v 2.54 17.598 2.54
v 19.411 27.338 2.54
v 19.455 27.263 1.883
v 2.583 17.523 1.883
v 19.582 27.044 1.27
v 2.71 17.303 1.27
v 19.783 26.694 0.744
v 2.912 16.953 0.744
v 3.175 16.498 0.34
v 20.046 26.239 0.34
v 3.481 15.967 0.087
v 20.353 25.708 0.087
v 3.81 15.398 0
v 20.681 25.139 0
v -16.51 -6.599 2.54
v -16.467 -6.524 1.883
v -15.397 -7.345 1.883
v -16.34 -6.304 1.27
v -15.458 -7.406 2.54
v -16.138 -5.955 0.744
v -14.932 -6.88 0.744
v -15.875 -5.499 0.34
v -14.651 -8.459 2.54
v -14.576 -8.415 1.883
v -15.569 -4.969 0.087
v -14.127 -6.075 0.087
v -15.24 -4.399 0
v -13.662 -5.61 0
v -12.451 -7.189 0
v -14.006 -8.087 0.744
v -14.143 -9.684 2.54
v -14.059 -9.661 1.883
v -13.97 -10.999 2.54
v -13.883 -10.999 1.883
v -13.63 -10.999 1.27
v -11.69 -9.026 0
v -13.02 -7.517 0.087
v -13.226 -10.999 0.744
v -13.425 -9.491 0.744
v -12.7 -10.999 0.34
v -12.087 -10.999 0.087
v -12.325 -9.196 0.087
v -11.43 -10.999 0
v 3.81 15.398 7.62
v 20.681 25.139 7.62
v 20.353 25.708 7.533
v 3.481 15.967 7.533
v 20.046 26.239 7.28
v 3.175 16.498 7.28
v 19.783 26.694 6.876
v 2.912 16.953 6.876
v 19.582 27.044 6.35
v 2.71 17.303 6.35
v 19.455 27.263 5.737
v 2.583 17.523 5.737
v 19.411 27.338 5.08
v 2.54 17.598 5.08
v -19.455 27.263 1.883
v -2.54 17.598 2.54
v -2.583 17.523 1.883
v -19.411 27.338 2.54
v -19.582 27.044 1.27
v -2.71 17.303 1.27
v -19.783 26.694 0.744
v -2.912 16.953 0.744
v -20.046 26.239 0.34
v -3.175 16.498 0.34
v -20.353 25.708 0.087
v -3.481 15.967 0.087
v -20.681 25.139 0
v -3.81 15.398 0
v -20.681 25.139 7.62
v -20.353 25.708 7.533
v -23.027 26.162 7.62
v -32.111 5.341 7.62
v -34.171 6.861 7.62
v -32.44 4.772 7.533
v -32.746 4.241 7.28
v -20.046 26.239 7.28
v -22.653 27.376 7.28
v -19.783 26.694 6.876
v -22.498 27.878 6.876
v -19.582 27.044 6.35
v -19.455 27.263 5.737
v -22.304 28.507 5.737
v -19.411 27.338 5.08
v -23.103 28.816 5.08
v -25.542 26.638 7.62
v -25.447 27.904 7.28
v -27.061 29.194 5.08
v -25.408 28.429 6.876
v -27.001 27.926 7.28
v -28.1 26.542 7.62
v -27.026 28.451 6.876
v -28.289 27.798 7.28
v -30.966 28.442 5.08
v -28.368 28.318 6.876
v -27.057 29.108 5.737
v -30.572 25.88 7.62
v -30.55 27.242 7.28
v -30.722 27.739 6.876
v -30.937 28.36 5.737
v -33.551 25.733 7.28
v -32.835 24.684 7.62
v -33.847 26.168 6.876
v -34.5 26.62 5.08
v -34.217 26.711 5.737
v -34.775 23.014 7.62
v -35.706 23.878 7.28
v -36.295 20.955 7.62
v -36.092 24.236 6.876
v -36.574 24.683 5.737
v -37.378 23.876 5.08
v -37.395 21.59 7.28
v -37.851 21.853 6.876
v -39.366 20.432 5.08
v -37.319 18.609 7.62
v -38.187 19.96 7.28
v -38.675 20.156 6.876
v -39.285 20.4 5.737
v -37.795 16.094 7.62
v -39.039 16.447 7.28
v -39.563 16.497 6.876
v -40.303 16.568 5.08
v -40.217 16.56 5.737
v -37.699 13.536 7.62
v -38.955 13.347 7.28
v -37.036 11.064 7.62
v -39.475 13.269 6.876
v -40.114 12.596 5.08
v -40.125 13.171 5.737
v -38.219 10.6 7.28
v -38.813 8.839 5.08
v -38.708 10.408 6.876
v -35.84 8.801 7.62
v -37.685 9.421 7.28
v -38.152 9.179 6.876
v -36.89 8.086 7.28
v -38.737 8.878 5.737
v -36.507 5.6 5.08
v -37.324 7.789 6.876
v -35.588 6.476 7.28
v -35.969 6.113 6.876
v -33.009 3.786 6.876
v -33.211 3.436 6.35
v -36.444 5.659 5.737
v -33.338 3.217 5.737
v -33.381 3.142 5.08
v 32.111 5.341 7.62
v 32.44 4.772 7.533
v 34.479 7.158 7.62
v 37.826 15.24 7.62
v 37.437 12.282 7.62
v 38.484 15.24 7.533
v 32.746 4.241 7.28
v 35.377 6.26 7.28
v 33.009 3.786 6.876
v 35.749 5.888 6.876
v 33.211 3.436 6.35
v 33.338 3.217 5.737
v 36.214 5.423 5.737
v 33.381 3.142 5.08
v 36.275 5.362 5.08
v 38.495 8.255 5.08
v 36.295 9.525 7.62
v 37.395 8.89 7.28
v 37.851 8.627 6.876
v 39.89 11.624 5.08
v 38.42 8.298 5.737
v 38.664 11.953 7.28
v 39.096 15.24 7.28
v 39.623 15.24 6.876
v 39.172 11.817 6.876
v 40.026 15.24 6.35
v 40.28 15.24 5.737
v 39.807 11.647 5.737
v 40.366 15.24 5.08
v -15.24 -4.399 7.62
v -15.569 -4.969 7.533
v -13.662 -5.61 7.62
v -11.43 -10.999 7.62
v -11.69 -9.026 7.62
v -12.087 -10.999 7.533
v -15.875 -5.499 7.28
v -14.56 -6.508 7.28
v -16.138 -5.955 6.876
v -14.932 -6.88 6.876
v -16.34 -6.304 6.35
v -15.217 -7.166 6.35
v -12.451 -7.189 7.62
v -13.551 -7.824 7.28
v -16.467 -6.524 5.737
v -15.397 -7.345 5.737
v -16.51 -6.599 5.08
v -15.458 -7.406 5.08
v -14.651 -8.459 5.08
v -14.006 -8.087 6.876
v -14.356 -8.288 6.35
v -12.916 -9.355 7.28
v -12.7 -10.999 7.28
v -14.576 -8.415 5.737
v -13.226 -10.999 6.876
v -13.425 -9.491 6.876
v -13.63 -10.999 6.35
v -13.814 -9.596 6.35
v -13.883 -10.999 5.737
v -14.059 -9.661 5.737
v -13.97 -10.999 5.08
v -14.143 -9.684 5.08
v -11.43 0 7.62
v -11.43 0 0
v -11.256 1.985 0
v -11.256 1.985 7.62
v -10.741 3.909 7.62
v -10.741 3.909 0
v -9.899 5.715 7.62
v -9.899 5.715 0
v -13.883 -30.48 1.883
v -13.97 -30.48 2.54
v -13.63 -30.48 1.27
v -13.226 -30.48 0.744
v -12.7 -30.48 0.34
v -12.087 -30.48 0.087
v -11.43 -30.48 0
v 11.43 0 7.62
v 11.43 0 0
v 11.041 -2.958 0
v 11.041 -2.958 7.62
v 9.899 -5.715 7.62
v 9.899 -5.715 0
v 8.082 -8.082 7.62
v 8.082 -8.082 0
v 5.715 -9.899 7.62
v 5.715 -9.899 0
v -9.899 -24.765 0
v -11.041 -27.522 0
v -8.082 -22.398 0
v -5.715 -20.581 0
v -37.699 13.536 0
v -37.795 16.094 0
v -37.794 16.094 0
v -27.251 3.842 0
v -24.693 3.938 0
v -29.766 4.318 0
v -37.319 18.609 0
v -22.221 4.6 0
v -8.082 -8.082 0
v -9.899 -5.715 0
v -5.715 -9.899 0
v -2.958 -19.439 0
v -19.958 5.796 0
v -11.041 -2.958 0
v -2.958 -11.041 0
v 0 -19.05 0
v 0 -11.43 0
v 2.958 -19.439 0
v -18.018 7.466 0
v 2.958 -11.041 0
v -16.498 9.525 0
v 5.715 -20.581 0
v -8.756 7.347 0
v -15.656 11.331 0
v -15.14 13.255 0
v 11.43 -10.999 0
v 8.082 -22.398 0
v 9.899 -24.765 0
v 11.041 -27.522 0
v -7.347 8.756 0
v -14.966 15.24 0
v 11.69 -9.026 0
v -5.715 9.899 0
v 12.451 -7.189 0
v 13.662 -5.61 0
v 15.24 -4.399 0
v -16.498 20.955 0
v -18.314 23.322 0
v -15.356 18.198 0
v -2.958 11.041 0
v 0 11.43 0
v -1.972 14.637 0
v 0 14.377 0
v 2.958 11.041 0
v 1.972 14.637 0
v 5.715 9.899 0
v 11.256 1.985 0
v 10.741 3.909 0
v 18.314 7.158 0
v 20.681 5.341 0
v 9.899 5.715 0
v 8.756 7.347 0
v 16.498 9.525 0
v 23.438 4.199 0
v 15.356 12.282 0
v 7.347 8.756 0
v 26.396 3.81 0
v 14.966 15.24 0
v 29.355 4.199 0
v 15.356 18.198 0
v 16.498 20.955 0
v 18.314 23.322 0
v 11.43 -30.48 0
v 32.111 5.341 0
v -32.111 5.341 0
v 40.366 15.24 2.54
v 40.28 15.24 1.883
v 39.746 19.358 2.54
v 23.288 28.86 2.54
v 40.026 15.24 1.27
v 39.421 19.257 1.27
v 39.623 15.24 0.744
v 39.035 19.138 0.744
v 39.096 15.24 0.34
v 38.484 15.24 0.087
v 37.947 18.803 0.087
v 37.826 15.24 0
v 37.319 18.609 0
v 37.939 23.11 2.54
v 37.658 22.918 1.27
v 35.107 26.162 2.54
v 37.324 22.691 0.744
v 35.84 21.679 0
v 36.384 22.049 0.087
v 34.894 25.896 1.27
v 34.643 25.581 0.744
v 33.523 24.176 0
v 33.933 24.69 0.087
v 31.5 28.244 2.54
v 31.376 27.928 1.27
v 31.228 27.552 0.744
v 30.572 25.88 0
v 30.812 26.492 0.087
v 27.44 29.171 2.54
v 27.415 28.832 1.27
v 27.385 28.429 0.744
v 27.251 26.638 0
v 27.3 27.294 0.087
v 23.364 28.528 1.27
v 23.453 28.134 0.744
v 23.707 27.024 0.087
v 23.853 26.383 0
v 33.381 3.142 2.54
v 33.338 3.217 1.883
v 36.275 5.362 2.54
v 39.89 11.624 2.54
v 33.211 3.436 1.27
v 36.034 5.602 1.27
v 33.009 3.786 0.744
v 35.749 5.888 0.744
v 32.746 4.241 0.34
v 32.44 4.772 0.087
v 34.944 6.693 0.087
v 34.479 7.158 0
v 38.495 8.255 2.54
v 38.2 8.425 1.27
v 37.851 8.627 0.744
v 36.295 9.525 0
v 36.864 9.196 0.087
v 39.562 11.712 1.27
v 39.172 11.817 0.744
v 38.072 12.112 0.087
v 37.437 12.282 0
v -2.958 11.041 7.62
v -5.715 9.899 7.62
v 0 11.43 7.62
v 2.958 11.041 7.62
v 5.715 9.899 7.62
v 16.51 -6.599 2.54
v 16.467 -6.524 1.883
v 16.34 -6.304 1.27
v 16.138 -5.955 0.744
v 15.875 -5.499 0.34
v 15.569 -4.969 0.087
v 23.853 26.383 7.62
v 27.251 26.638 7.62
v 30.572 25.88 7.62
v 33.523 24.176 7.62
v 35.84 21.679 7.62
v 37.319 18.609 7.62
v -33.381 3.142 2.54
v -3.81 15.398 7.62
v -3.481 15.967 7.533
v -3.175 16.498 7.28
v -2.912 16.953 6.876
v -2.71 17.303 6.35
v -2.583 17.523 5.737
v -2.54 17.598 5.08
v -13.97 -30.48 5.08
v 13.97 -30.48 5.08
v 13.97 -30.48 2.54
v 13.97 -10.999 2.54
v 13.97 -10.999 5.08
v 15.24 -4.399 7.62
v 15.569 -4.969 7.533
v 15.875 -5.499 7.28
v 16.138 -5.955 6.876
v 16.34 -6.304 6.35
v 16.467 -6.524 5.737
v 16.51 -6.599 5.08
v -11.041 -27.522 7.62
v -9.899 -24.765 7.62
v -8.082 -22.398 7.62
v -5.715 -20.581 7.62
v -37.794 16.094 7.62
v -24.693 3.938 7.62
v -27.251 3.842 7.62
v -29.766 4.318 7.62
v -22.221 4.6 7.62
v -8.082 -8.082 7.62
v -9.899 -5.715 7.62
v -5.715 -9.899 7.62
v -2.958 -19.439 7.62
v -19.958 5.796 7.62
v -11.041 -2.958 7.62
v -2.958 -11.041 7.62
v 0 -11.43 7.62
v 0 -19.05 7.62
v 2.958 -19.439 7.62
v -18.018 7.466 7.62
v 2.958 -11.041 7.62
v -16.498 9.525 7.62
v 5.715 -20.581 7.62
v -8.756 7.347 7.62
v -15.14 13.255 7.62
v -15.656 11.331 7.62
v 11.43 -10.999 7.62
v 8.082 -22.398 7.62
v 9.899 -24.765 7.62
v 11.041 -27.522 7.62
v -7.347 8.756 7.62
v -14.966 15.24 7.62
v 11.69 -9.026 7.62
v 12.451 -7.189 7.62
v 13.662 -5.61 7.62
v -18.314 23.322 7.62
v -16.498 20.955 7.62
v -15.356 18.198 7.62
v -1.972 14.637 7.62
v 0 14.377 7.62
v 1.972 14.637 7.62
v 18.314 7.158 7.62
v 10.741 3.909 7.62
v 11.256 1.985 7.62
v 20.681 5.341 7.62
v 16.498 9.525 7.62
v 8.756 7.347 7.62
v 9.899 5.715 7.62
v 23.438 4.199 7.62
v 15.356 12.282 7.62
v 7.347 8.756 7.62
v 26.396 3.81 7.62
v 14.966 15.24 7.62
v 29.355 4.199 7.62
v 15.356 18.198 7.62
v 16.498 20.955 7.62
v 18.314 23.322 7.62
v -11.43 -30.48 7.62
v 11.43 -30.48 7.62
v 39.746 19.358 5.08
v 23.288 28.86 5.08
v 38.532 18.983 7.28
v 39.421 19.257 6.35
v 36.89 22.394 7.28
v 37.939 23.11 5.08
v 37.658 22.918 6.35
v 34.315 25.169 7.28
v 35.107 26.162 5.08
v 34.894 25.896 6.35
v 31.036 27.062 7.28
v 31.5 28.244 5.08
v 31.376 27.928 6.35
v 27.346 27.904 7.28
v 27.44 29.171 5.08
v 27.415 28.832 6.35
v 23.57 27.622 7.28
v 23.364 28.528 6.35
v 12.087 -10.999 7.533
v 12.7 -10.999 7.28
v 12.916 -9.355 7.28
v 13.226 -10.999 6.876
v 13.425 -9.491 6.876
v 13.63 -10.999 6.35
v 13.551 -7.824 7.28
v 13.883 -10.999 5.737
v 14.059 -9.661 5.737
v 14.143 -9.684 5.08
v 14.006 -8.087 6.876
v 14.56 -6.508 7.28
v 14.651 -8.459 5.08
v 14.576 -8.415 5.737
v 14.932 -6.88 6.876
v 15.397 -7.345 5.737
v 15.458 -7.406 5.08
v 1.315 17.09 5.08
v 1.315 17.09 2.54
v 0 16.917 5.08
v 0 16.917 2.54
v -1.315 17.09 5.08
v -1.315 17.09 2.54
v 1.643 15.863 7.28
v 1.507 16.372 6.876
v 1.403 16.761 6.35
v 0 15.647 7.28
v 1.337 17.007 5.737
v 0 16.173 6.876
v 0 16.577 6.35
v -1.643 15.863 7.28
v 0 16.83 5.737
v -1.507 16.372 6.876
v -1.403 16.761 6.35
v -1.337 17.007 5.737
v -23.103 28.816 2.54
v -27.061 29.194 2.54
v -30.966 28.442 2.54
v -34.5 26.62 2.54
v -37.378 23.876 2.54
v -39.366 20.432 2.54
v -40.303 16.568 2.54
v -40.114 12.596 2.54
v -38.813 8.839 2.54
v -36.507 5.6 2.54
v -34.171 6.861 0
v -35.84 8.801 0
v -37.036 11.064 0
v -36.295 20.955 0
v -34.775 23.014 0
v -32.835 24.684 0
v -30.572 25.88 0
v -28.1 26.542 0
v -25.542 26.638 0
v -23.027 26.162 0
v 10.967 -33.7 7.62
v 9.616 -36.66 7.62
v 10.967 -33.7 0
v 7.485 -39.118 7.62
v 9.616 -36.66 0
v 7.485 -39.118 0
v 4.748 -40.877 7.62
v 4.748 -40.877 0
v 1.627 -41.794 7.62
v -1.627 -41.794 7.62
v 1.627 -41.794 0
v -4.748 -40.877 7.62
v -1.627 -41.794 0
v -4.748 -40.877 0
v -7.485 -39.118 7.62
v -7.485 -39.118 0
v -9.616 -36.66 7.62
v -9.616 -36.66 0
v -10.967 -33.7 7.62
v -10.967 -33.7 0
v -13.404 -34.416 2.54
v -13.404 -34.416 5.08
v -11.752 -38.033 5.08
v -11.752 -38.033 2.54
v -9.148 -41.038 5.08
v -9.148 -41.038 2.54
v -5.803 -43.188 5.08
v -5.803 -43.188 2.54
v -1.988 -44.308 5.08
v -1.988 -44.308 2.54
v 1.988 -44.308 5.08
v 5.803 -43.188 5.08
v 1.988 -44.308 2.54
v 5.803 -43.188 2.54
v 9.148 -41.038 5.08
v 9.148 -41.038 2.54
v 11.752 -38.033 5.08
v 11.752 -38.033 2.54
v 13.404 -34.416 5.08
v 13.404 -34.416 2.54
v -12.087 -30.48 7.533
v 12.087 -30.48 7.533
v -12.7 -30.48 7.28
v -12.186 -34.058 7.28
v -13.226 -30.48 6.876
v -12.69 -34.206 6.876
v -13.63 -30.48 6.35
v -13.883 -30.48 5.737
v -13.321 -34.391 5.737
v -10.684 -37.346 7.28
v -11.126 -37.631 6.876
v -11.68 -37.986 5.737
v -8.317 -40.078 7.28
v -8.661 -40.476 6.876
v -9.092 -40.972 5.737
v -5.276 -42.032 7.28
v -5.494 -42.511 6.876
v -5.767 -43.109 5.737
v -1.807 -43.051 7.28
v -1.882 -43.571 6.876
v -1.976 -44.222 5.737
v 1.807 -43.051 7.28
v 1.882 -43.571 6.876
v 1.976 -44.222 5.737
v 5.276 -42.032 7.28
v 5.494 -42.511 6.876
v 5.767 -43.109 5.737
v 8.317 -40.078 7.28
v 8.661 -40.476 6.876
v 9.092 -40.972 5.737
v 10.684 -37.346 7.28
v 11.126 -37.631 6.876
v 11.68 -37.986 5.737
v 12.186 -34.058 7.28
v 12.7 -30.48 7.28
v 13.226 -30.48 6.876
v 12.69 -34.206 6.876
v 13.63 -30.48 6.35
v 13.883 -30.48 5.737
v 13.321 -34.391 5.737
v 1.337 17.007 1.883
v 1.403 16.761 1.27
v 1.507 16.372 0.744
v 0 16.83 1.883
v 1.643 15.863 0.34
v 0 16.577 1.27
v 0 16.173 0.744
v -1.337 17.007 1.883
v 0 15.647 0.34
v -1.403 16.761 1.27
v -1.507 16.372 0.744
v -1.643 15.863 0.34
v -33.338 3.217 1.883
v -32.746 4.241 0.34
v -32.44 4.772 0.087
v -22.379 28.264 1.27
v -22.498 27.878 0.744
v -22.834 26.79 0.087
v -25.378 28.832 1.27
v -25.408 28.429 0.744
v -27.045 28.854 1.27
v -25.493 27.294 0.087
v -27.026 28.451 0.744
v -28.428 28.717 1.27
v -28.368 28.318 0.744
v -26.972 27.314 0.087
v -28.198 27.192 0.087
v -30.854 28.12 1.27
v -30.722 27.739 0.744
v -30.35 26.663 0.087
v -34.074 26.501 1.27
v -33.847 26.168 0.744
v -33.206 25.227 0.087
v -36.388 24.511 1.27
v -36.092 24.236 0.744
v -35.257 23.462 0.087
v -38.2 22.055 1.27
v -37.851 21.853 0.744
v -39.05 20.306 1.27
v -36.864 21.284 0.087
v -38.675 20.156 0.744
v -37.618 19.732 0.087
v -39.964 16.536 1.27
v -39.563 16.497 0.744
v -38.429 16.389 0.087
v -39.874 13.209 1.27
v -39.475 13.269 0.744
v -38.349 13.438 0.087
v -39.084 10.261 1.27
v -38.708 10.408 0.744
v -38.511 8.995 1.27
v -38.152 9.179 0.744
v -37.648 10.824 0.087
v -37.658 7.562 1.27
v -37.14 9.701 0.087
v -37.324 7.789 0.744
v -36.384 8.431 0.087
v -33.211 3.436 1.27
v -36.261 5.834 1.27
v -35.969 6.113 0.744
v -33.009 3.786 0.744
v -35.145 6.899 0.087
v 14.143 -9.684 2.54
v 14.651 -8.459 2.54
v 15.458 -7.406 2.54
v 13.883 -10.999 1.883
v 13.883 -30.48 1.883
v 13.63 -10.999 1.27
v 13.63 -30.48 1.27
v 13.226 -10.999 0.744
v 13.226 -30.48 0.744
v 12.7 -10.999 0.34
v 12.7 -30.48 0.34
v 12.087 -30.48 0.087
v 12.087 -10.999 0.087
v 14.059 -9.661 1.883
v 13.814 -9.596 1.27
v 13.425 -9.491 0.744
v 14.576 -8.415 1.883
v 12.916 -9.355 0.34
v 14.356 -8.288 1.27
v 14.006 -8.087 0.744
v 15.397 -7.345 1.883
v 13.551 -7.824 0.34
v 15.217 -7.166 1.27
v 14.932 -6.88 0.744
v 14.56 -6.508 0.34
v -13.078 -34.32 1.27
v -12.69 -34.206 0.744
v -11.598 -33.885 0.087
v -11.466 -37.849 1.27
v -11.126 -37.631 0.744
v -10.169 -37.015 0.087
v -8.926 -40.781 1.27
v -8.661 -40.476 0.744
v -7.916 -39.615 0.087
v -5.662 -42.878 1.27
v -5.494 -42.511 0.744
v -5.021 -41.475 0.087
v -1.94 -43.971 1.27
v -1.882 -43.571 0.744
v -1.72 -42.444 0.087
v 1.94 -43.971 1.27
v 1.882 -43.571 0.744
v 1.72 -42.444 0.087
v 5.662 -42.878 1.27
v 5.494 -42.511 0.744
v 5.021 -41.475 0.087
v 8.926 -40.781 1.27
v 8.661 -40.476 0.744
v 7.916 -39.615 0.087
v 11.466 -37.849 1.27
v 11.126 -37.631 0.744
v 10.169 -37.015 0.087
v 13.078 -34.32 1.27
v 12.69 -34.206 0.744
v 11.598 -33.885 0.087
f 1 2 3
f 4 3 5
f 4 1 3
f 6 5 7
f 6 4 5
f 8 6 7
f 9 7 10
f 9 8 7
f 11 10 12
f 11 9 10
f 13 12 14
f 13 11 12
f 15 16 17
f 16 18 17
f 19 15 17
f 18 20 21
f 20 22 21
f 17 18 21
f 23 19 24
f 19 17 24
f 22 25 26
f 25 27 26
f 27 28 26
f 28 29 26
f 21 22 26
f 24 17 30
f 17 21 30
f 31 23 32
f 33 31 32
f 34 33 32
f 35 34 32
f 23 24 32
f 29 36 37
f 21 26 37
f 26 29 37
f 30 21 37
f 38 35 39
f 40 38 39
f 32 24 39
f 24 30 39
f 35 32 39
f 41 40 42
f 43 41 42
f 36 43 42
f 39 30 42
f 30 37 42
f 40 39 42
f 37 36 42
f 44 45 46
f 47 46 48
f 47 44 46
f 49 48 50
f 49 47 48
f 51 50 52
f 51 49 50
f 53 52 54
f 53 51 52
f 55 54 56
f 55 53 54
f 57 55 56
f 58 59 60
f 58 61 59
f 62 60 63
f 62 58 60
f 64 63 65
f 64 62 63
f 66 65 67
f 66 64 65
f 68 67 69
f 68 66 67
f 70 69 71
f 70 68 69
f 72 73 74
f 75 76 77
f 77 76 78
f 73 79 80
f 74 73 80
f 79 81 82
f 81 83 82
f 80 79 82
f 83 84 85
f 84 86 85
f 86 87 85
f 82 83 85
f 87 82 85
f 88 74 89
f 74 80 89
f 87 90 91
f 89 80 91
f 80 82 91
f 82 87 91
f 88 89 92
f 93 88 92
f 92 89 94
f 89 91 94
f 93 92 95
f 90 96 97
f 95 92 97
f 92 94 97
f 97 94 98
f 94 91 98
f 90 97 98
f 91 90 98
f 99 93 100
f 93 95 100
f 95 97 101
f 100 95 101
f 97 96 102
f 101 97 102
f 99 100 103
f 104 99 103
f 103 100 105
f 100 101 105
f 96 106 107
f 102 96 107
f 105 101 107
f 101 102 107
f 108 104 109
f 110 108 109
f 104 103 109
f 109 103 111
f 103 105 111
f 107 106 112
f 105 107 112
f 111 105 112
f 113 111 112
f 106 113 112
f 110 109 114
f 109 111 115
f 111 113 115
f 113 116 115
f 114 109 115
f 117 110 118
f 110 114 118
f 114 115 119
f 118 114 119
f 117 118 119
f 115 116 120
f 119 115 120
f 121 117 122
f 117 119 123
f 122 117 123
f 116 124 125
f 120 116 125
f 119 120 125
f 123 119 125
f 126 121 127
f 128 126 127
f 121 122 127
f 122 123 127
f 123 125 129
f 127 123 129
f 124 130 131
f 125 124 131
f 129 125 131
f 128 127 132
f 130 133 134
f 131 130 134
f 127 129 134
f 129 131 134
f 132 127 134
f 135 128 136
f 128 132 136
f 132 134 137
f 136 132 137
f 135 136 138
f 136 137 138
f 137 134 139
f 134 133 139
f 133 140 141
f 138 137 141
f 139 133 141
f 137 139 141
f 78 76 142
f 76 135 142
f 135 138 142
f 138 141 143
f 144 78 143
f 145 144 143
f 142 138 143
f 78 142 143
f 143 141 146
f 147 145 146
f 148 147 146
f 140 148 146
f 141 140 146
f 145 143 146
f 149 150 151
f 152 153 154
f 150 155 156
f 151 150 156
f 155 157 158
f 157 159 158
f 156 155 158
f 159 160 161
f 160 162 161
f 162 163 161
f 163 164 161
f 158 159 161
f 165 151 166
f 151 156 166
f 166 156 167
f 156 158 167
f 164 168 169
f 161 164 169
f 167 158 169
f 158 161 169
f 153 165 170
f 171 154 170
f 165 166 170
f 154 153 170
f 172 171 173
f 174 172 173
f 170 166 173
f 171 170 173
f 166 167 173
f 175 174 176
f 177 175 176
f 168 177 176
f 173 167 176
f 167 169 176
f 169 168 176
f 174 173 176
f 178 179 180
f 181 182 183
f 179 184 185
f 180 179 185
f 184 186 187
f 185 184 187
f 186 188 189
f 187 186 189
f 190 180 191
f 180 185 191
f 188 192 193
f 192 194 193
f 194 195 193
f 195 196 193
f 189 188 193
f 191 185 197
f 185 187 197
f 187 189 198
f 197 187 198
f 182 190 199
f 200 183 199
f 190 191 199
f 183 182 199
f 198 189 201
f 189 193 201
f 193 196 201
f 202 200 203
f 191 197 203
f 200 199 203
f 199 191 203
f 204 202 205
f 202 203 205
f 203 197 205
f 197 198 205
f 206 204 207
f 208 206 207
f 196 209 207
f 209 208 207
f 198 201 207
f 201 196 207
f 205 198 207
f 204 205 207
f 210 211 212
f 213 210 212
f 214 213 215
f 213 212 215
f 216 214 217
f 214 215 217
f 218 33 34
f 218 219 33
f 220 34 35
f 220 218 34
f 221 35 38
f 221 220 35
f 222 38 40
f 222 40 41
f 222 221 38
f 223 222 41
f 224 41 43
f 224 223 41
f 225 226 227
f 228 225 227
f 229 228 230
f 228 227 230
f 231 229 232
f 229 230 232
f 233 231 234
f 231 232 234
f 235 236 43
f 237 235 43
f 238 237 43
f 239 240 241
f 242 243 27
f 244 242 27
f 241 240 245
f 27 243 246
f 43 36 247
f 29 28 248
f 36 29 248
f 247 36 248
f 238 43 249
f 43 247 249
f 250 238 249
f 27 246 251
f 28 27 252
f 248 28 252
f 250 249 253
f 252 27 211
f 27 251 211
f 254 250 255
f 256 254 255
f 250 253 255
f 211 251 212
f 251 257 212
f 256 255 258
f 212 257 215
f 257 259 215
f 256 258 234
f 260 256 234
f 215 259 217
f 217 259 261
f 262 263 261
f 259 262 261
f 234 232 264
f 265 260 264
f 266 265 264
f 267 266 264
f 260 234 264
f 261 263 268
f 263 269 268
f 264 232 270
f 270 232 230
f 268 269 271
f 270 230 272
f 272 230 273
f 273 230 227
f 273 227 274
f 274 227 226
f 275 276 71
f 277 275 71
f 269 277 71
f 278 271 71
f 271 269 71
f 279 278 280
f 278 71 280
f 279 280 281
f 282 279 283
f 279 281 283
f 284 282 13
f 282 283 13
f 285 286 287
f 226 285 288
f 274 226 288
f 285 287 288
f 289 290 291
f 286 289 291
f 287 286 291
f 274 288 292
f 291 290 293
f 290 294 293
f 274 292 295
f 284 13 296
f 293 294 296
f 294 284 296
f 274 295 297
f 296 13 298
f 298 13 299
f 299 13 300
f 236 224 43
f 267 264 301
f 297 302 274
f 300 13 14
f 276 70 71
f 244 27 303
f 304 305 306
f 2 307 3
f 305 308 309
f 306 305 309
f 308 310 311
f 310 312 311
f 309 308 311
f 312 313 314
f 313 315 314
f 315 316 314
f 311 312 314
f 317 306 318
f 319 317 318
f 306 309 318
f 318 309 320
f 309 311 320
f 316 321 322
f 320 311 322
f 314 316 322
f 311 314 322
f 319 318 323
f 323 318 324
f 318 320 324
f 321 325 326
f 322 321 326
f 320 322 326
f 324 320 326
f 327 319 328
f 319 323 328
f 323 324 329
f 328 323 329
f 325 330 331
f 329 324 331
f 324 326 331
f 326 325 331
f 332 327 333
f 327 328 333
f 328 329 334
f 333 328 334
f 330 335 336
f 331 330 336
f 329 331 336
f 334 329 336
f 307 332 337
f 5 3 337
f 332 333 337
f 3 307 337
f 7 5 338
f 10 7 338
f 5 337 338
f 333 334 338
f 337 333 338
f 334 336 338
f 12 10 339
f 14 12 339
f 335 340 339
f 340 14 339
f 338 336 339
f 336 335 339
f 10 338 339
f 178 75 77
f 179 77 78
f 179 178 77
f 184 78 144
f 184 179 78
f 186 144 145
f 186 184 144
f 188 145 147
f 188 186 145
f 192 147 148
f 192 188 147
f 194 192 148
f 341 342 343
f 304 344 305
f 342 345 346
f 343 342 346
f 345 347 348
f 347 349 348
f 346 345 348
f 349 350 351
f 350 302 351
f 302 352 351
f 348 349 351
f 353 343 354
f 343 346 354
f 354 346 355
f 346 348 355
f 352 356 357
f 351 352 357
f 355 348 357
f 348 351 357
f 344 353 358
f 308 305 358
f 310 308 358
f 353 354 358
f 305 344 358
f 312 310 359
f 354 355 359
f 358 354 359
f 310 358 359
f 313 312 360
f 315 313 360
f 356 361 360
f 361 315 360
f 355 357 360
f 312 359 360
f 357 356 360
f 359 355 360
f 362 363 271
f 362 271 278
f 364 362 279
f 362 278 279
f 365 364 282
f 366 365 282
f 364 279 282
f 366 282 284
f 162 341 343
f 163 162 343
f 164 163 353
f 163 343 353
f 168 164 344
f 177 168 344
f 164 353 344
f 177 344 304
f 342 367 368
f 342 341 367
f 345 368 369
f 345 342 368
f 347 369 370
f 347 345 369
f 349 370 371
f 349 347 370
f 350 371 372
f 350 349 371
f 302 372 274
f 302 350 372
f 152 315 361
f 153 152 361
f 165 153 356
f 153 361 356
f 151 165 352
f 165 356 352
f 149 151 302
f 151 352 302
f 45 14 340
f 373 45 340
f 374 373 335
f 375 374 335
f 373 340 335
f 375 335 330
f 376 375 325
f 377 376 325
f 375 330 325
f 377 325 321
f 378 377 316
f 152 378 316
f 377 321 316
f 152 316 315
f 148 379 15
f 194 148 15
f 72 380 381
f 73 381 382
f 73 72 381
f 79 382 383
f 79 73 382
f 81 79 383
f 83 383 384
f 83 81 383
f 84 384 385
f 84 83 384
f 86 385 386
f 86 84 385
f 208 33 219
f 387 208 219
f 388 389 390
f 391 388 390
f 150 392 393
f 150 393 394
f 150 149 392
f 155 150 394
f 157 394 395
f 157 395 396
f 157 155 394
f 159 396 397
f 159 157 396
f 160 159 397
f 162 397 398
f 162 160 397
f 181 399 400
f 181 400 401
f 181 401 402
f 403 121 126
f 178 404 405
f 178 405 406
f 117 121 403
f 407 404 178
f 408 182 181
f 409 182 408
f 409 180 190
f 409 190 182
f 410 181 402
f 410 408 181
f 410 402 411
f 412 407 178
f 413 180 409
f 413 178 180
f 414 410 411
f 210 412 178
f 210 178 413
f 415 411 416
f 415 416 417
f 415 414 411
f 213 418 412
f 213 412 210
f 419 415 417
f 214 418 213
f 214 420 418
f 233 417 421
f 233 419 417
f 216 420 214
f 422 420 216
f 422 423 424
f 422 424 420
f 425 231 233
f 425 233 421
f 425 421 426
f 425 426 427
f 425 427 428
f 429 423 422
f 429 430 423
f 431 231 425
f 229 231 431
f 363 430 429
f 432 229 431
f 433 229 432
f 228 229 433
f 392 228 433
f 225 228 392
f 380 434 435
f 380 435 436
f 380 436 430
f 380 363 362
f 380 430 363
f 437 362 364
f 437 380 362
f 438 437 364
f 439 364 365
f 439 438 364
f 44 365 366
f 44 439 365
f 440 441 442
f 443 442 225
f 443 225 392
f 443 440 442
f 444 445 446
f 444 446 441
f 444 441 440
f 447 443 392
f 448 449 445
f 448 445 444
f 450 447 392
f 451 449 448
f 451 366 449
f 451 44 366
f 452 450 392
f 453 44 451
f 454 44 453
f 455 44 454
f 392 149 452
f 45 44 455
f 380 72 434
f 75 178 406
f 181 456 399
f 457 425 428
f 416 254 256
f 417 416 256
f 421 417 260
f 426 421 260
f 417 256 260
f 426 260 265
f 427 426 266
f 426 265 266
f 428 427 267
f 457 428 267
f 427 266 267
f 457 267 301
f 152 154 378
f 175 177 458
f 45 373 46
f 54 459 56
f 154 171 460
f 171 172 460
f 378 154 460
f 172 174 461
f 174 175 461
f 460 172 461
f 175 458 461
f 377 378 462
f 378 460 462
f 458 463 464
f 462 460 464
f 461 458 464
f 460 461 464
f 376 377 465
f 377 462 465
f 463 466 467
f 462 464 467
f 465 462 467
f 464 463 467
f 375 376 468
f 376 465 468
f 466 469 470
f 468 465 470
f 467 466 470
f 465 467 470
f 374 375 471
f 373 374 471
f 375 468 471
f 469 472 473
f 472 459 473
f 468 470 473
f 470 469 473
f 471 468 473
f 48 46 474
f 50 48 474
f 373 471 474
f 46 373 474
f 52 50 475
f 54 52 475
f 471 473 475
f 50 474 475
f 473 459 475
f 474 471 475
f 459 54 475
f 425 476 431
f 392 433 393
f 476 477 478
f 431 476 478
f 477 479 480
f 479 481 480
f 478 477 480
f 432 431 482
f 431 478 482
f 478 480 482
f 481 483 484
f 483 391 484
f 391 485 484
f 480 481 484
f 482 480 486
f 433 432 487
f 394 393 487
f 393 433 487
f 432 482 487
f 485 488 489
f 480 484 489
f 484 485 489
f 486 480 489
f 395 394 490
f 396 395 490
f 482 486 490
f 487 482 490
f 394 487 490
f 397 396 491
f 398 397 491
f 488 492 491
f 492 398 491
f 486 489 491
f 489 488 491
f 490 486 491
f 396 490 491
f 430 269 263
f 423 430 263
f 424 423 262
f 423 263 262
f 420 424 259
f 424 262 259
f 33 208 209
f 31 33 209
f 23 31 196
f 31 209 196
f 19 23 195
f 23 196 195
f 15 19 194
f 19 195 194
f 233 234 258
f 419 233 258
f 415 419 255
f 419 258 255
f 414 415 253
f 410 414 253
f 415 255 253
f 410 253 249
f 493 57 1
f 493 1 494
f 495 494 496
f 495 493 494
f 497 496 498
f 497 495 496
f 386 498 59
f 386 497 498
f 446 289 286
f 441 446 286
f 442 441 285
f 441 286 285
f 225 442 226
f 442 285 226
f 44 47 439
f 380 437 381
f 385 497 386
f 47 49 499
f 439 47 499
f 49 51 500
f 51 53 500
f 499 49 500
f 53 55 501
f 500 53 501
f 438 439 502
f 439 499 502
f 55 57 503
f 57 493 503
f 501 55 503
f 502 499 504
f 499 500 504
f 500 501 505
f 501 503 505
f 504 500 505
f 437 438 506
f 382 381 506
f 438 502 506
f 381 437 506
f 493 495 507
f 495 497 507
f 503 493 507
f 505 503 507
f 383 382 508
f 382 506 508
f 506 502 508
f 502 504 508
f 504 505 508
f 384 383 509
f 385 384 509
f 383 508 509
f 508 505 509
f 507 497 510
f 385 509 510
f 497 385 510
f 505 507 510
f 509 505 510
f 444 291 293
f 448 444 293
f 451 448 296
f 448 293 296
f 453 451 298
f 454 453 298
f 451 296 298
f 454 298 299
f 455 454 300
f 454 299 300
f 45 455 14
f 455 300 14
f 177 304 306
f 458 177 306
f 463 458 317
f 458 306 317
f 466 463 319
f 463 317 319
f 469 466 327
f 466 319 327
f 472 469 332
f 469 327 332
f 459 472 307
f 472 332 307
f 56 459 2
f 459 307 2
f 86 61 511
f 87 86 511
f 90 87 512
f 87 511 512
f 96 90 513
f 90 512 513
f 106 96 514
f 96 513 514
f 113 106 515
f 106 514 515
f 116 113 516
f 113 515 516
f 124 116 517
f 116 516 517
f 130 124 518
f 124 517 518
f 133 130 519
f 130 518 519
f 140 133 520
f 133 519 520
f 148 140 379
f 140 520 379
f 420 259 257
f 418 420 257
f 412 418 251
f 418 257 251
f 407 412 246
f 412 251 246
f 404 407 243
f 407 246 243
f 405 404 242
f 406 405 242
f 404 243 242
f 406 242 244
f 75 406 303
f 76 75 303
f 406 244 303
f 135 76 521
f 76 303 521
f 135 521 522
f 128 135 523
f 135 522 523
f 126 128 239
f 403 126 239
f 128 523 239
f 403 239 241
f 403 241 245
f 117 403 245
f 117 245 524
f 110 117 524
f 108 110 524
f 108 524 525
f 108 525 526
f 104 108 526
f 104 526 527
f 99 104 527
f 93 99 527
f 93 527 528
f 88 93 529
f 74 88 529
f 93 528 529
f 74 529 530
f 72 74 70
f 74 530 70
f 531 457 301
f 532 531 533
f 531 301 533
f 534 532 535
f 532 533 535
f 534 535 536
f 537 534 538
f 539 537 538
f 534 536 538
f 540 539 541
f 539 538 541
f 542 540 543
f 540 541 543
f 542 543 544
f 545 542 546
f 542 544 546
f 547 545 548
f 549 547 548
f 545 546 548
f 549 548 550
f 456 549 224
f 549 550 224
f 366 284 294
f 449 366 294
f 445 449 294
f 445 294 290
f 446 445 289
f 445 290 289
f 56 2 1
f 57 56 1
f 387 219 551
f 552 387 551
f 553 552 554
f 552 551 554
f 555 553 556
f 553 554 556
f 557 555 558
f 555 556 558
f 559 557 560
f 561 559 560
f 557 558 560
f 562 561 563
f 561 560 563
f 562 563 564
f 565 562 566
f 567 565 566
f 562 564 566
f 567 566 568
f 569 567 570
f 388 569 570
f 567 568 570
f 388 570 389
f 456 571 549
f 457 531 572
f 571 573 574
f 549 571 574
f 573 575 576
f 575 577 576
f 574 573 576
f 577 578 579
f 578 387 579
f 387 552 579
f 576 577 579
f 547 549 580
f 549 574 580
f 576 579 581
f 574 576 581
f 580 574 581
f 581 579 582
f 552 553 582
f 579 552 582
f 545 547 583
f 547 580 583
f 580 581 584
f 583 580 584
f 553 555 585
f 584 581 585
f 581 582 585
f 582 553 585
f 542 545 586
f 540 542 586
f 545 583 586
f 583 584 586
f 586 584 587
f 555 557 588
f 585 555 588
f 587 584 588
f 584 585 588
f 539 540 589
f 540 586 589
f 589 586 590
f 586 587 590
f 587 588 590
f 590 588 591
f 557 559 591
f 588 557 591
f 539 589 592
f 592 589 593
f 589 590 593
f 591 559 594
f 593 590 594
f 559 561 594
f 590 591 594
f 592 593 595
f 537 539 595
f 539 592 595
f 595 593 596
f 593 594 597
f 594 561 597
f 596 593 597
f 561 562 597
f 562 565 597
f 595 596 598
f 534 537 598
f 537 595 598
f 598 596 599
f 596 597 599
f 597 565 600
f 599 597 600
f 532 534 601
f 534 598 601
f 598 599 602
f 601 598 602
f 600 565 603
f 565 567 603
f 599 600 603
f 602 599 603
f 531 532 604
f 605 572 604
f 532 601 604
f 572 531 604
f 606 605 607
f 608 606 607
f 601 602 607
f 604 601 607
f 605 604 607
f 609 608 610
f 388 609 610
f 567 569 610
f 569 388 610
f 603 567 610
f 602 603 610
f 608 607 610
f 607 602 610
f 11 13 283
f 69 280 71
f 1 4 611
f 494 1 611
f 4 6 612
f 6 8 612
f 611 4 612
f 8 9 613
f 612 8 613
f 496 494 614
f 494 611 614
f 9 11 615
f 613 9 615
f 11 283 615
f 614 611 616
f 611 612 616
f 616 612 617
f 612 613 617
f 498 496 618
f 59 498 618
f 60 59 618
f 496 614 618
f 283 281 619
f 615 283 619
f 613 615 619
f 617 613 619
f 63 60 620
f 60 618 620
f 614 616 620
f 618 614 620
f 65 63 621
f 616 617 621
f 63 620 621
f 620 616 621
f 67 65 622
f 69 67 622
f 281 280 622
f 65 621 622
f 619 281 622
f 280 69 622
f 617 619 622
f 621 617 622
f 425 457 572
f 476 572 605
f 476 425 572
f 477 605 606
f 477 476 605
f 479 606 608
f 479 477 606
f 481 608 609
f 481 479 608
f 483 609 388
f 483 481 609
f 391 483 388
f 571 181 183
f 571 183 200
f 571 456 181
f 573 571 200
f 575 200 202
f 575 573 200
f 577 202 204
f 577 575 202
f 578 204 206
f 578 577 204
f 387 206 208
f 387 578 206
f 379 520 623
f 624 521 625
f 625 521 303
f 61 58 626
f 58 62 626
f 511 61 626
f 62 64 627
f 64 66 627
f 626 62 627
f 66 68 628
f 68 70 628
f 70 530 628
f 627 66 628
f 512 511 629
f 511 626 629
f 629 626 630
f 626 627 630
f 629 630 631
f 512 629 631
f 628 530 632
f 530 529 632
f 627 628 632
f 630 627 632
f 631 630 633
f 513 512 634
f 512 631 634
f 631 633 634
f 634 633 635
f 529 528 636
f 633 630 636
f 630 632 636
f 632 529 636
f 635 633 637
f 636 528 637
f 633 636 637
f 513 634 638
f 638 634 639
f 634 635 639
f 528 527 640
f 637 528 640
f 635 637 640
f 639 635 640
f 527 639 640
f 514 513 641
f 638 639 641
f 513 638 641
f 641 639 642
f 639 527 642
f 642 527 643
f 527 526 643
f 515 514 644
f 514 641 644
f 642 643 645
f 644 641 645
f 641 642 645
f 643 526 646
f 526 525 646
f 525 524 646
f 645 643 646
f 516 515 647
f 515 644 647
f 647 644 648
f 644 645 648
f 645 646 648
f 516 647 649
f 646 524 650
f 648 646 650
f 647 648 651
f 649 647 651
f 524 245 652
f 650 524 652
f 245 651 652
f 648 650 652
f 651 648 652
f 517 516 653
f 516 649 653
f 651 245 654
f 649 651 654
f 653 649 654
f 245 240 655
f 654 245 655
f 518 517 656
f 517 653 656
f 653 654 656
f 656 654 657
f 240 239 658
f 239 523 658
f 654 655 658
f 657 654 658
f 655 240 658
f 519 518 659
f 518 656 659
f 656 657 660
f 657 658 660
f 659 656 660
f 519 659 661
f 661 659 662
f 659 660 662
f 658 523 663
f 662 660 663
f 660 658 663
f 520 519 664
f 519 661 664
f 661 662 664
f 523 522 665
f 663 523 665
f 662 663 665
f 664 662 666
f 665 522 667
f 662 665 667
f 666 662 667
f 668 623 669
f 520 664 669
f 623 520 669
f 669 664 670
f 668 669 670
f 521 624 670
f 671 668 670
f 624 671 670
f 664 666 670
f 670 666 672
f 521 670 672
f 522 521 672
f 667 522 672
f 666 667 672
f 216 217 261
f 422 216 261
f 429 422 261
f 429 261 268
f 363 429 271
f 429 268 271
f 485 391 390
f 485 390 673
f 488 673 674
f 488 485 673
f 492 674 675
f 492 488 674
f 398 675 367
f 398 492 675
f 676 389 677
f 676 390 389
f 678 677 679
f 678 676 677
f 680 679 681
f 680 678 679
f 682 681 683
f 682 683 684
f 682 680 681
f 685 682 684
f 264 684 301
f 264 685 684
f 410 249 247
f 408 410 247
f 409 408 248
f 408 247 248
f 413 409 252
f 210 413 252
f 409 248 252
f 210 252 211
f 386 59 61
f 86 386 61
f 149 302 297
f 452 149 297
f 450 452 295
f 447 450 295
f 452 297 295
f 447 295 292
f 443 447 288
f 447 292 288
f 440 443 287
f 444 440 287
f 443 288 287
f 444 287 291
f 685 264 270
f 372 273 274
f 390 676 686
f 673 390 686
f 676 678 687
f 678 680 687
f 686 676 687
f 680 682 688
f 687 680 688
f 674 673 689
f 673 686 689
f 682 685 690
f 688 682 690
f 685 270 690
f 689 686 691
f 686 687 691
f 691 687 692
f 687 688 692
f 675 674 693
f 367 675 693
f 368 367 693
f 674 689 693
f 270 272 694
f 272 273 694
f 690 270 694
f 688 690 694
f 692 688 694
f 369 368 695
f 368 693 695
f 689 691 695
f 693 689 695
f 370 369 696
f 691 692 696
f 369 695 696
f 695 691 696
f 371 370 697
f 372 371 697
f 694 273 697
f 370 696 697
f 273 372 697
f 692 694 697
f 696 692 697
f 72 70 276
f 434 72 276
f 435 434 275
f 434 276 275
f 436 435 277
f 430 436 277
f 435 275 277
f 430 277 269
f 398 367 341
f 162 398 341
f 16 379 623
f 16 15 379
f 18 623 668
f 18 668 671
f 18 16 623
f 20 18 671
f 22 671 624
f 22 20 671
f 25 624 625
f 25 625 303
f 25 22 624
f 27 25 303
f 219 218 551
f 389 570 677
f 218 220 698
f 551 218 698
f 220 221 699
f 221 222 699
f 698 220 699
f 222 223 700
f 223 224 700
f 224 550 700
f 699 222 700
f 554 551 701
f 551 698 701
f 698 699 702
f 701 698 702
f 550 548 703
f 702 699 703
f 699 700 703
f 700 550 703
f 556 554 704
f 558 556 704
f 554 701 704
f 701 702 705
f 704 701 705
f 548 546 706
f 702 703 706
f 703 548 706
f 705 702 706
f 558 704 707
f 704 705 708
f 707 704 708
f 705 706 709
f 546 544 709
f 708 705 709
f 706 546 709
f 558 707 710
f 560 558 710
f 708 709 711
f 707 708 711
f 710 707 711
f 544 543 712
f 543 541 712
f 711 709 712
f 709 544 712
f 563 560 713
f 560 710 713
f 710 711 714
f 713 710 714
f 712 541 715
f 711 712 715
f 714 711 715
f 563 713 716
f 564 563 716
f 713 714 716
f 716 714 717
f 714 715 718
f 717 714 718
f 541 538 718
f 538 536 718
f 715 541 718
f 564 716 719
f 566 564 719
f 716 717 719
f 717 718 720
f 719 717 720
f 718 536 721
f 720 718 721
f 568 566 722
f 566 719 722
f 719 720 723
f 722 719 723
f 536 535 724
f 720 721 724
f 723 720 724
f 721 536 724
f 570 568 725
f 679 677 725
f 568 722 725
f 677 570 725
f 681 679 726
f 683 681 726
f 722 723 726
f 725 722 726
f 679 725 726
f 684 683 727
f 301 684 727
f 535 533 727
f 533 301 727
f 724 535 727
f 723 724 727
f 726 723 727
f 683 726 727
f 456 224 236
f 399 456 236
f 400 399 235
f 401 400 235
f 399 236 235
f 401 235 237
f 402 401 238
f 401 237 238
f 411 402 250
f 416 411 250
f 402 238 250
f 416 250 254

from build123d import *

# Parameters (mm, degrees)
F1_DEPTH = 7.62
F2_R     = 5.08
F3_R     = 2.53999


# Not quite as in the source:
# - a fillet or chamfer is up to 0.001 mm smaller than in the source, because OpenCascade refuses the exact size
# - a feature names something its author has since deleted; it is built from what else it names


with BuildPart() as f1:
    # F0 (on Top) → F1 (new body)
    with BuildSketch(Plane.XY):
        with BuildLine():
            Line((5.715, 9.8986703653), (6.985, 12.0983748909))
            ThreePointArc((6.985, 12.0983748909), (0, 13.97), (-6.985, 12.0983748909))
            Line((-6.985, 12.0983748909), (-5.715, 9.8986703653))
            ThreePointArc((-5.715, 9.8986703653), (0, 11.43), (5.715, 9.8986703653))
        make_face()
        with BuildLine():
            Line((0, 16.1311665212), (6.985, 12.0983748909))
            ThreePointArc((6.985, 12.0983748909), (9.8782817332, 9.8782817332), (12.0983748909, 6.985))
            Line((12.0983748909, 6.985), (14.2980794165, 8.255))
            ThreePointArc((14.2980794165, 8.255), (12.9024705141, 18.8557020601), (19.4114543073, 27.3383748909))
            Line((19.4114543073, 27.3383748909), (0, 16.1311665212))
        make_face()
        with BuildLine():
            ThreePointArc((-6.985, 12.0983748909), (0, 13.97), (6.985, 12.0983748909))
            Line((6.985, 12.0983748909), (0, 16.1311665212))
            Line((0, 16.1311665212), (-6.985, 12.0983748909))
        make_face()
        with BuildLine():
            ThreePointArc((12.0983748909, 6.985), (9.8782817332, 9.8782817332), (6.985, 12.0983748909))
            Line((6.985, 12.0983748909), (5.715, 9.8986703653))
            ThreePointArc((5.715, 9.8986703653), (8.082230509, 8.082230509), (9.8986703653, 5.715))
            Line((9.8986703653, 5.715), (12.0983748909, 6.985))
        make_face()
        with BuildLine():
            Line((-5.715, 9.8986703653), (-6.985, 12.0983748909))
            ThreePointArc((-6.985, 12.0983748909), (-9.8782817332, 9.8782817332), (-12.0983748909, 6.985))
            Line((-12.0983748909, 6.985), (-9.8986703653, 5.715))
            ThreePointArc((-9.8986703653, 5.715), (-8.082230509, 8.082230509), (-5.715, 9.8986703653))
        make_face()
        with BuildLine():
            ThreePointArc((-12.0983748909, 6.985), (-9.8782817332, 9.8782817332), (-6.985, 12.0983748909))
            Line((-6.985, 12.0983748909), (0, 16.1311665212))
            Line((0, 16.1311665212), (-19.4114543073, 27.3383748909))
            ThreePointArc((-19.4114543073, 27.3383748909), (-14.2980794165, 22.225), (-12.4264543073, 15.24))
            ThreePointArc((-12.4264543073, 15.24), (-12.9024705141, 11.6242979399), (-14.2980794165, 8.255))
            Line((-14.2980794165, 8.255), (-12.0983748909, 6.985))
        make_face()
        with BuildLine():
            Line((14.2980794165, 8.255), (12.0983748909, 6.985))
            ThreePointArc((12.0983748909, 6.985), (13.4939837933, 3.6157020601), (13.97, 0))
            Line((13.97, 0), (13.97, -8.0655832606))
            Line((13.97, -8.0655832606), (33.3814543073, 3.1416251091))
            ThreePointArc((33.3814543073, 3.1416251091), (22.7807522473, 1.7460162067), (14.2980794165, 8.255))
        make_face()
        with BuildLine():
            ThreePointArc((13.97, 0), (13.4939837933, 3.6157020601), (12.0983748909, 6.985))
            Line((12.0983748909, 6.985), (9.8986703653, 5.715))
            ThreePointArc((9.8986703653, 5.715), (11.0405321945, 2.9583016855), (11.43, 0))
            Line((11.43, 0), (13.97, 0))
        make_face()
        with BuildLine():
            Line((-9.8986703653, 5.715), (-12.0983748909, 6.985))
            ThreePointArc((-12.0983748909, 6.985), (-13.4939837933, 3.6157020601), (-13.97, 0))
            Line((-13.97, 0), (-11.43, 0))
            ThreePointArc((-11.43, 0), (-11.0405321945, 2.9583016855), (-9.8986703653, 5.715))
        make_face()
        with BuildLine():
            ThreePointArc((-13.97, 0), (-13.4939837933, 3.6157020601), (-12.0983748909, 6.985))
            Line((-12.0983748909, 6.985), (-14.2980794165, 8.255))
            ThreePointArc((-14.2980794165, 8.255), (-22.7807522473, 1.7460162067), (-33.3814543073, 3.1416251091))
            Line((-33.3814543073, 3.1416251091), (-13.97, -8.0655832606))
            Line((-13.97, -8.0655832606), (-13.97, 0))
        make_face()
        with BuildLine():
            Line((13.97, -8.0655832606), (13.97, 0))
            ThreePointArc((13.97, 0), (12.0983748909, -6.985), (6.985, -12.0983748909))
            Line((6.985, -12.0983748909), (13.97, -8.0655832606))
        make_face()
        with BuildLine():
            ThreePointArc((6.985, -12.0983748909), (12.0983748909, -6.985), (13.97, 0))
            Line((13.97, 0), (11.43, 0))
            ThreePointArc((11.43, 0), (9.8986703653, -5.715), (5.715, -9.8986703653))
            Line((5.715, -9.8986703653), (6.985, -12.0983748909))
        make_face()
        with BuildLine():
            Line((16.4977839421, 9.525), (14.2980794165, 8.255))
            ThreePointArc((14.2980794165, 8.255), (22.7807522473, 1.7460162067), (33.3814543073, 3.1416251091))
            Line((33.3814543073, 3.1416251091), (32.1114543073, 5.3413296347))
            ThreePointArc((32.1114543073, 5.3413296347), (23.4381526218, 4.1994678055), (16.4977839421, 9.525))
        make_face()
        with BuildLine():
            ThreePointArc((19.4114543073, 27.3383748909), (12.9024705141, 18.8557020601), (14.2980794165, 8.255))
            Line((14.2980794165, 8.255), (16.4977839421, 9.525))
            ThreePointArc((16.4977839421, 9.525), (15.3559221129, 18.1983016855), (20.6814543073, 25.1386703653))
            Line((20.6814543073, 25.1386703653), (19.4114543073, 27.3383748909))
        make_face()
        with BuildLine():
            ThreePointArc((40.3664543073, 15.24), (33.3814543073, 27.3383748909), (19.4114543073, 27.3383748909))
            Line((19.4114543073, 27.3383748909), (20.6814543073, 25.1386703653))
            ThreePointArc((20.6814543073, 25.1386703653), (32.1114543073, 25.1386703653), (37.8264543073, 15.24))
            ThreePointArc((37.8264543073, 15.24), (36.2951246726, 9.525), (32.1114543073, 5.3413296347))
            Line((32.1114543073, 5.3413296347), (33.3814543073, 3.1416251091))
            ThreePointArc((33.3814543073, 3.1416251091), (38.4948291982, 8.255), (40.3664543073, 15.24))
        make_face()
        with BuildLine():
            Line((-20.6814543073, 25.1386703653), (-19.4114543073, 27.3383748909))
            ThreePointArc((-19.4114543073, 27.3383748909), (-38.4948291982, 22.225), (-33.3814543073, 3.1416251091))
            Line((-33.3814543073, 3.1416251091), (-32.1114543073, 5.3413296347))
            ThreePointArc((-32.1114543073, 5.3413296347), (-36.2951246726, 20.955), (-20.6814543073, 25.1386703653))
        make_face()
        with BuildLine():
            ThreePointArc((-12.4264543073, 15.24), (-14.2980794165, 22.225), (-19.4114543073, 27.3383748909))
            Line((-19.4114543073, 27.3383748909), (-20.6814543073, 25.1386703653))
            ThreePointArc((-20.6814543073, 25.1386703653), (-16.4977839421, 20.955), (-14.9664543073, 15.24))
            ThreePointArc((-14.9664543073, 15.24), (-15.3559221129, 12.2816983145), (-16.4977839421, 9.525))
            Line((-16.4977839421, 9.525), (-14.2980794165, 8.255))
            ThreePointArc((-14.2980794165, 8.255), (-12.9024705141, 11.6242979399), (-12.4264543073, 15.24))
        make_face()
        with BuildLine():
            Line((-11.43, 0), (-13.97, 0))
            ThreePointArc((-13.97, 0), (-12.0983748909, -6.985), (-6.985, -12.0983748909))
            Line((-6.985, -12.0983748909), (-5.715, -9.8986703653))
            ThreePointArc((-5.715, -9.8986703653), (-9.8986703653, -5.715), (-11.43, 0))
        make_face()
        with BuildLine():
            ThreePointArc((-6.985, -12.0983748909), (-12.0983748909, -6.985), (-13.97, 0))
            Line((-13.97, 0), (-13.97, -8.0655832606))
            Line((-13.97, -8.0655832606), (-6.985, -12.0983748909))
        make_face()
        with BuildLine():
            ThreePointArc((-33.3814543073, 3.1416251091), (-22.7807522473, 1.7460162067), (-14.2980794165, 8.255))
            Line((-14.2980794165, 8.255), (-16.4977839421, 9.525))
            ThreePointArc((-16.4977839421, 9.525), (-23.4381526218, 4.1994678055), (-32.1114543073, 5.3413296347))
            Line((-32.1114543073, 5.3413296347), (-33.3814543073, 3.1416251091))
        make_face()
        with BuildLine():
            Line((13.97, -8.0655832606), (6.985, -12.0983748909))
            ThreePointArc((6.985, -12.0983748909), (3.6157020601, -13.4939837933), (0, -13.97))
            Line((0, -13.97), (0, -16.51))
            ThreePointArc((0, -16.51), (9.8782817332, -20.6017182668), (13.97, -30.48))
            Line((13.97, -30.48), (13.97, -8.0655832606))
        make_face()
        with BuildLine():
            ThreePointArc((0, -13.97), (3.6157020601, -13.4939837933), (6.985, -12.0983748909))
            Line((6.985, -12.0983748909), (5.715, -9.8986703653))
            ThreePointArc((5.715, -9.8986703653), (2.9583016855, -11.0405321945), (0, -11.43))
            Line((0, -11.43), (0, -13.97))
        make_face()
        with BuildLine():
            Line((0, -13.97), (0, -11.43))
            ThreePointArc((0, -11.43), (-2.9583016855, -11.0405321945), (-5.715, -9.8986703653))
            Line((-5.715, -9.8986703653), (-6.985, -12.0983748909))
            ThreePointArc((-6.985, -12.0983748909), (-3.6157020601, -13.4939837933), (0, -13.97))
        make_face()
        with BuildLine():
            ThreePointArc((0, -13.97), (-3.6157020601, -13.4939837933), (-6.985, -12.0983748909))
            Line((-6.985, -12.0983748909), (-13.97, -8.0655832606))
            Line((-13.97, -8.0655832606), (-13.97, -30.48))
            ThreePointArc((-13.97, -30.48), (-9.8782817332, -20.6017182668), (0, -16.51))
            Line((0, -16.51), (0, -13.97))
        make_face()
        with BuildLine():
            Line((11.43, -30.48), (13.97, -30.48))
            ThreePointArc((13.97, -30.48), (9.8782817332, -20.6017182668), (0, -16.51))
            Line((0, -16.51), (0, -19.05))
            ThreePointArc((0, -19.05), (8.082230509, -22.397769491), (11.43, -30.48))
        make_face()
        with BuildLine():
            ThreePointArc((-13.97, -30.48), (0, -44.45), (13.97, -30.48))
            Line((13.97, -30.48), (11.43, -30.48))
            ThreePointArc((11.43, -30.48), (0, -41.91), (-11.43, -30.48))
            Line((-11.43, -30.48), (-13.97, -30.48))
        make_face()
        with BuildLine():
            ThreePointArc((0, -16.51), (-9.8782817332, -20.6017182668), (-13.97, -30.48))
            Line((-13.97, -30.48), (-11.43, -30.48))
            ThreePointArc((-11.43, -30.48), (-8.082230509, -22.397769491), (0, -19.05))
            Line((0, -19.05), (0, -16.51))
        make_face()
    extrude(amount=F1_DEPTH)

    # F2
    f2_edges = [f1.edges().sort_by_distance(p)[0] for p in [
        (0, 16.131167, 3.81),
        (13.97, -8.065583, 3.81),
        (-13.97, -8.065583, 3.81),
    ]]
    fillet(f2_edges, radius=F2_R)

    # F3 (radius 2.54 in the source; OpenCascade refuses exactly that, so slightly less here)
    f3_edges = [f1.edges().sort_by_distance(p)[0] for p in [
        (24.945727, -1.728744, 7.62),
        (14.650591, -8.458523, 7.62),
        (-13.97, -20.739261, 0),
        (10.975727, 22.468006, 0),
        (10.975727, 22.468006, 7.62),
        (0, 16.917045, 0),
        (38.494829, 22.225, 0),
        (-10.975727, 22.468006, 0),
        (24.945727, -1.728744, 0),
        (-38.494829, 22.225, 0),
        (14.650591, -8.458523, 0),
        (-24.945727, -1.728744, 0),
        (13.97, -20.739261, 0),
        (-14.650591, -8.458523, 0),
        (0, -44.45, 0),
        (0, 16.917045, 7.62),
        (38.494829, 22.225, 7.62),
        (-10.975727, 22.468006, 7.62),
        (-38.494829, 22.225, 7.62),
        (-24.945727, -1.728744, 7.62),
        (13.97, -20.739261, 7.62),
        (-14.650591, -8.458523, 7.62),
        (0, -44.45, 7.62),
        (-13.97, -20.739261, 7.62),
    ]]
    fillet(f3_edges, radius=F3_R)


solid = f1.part
